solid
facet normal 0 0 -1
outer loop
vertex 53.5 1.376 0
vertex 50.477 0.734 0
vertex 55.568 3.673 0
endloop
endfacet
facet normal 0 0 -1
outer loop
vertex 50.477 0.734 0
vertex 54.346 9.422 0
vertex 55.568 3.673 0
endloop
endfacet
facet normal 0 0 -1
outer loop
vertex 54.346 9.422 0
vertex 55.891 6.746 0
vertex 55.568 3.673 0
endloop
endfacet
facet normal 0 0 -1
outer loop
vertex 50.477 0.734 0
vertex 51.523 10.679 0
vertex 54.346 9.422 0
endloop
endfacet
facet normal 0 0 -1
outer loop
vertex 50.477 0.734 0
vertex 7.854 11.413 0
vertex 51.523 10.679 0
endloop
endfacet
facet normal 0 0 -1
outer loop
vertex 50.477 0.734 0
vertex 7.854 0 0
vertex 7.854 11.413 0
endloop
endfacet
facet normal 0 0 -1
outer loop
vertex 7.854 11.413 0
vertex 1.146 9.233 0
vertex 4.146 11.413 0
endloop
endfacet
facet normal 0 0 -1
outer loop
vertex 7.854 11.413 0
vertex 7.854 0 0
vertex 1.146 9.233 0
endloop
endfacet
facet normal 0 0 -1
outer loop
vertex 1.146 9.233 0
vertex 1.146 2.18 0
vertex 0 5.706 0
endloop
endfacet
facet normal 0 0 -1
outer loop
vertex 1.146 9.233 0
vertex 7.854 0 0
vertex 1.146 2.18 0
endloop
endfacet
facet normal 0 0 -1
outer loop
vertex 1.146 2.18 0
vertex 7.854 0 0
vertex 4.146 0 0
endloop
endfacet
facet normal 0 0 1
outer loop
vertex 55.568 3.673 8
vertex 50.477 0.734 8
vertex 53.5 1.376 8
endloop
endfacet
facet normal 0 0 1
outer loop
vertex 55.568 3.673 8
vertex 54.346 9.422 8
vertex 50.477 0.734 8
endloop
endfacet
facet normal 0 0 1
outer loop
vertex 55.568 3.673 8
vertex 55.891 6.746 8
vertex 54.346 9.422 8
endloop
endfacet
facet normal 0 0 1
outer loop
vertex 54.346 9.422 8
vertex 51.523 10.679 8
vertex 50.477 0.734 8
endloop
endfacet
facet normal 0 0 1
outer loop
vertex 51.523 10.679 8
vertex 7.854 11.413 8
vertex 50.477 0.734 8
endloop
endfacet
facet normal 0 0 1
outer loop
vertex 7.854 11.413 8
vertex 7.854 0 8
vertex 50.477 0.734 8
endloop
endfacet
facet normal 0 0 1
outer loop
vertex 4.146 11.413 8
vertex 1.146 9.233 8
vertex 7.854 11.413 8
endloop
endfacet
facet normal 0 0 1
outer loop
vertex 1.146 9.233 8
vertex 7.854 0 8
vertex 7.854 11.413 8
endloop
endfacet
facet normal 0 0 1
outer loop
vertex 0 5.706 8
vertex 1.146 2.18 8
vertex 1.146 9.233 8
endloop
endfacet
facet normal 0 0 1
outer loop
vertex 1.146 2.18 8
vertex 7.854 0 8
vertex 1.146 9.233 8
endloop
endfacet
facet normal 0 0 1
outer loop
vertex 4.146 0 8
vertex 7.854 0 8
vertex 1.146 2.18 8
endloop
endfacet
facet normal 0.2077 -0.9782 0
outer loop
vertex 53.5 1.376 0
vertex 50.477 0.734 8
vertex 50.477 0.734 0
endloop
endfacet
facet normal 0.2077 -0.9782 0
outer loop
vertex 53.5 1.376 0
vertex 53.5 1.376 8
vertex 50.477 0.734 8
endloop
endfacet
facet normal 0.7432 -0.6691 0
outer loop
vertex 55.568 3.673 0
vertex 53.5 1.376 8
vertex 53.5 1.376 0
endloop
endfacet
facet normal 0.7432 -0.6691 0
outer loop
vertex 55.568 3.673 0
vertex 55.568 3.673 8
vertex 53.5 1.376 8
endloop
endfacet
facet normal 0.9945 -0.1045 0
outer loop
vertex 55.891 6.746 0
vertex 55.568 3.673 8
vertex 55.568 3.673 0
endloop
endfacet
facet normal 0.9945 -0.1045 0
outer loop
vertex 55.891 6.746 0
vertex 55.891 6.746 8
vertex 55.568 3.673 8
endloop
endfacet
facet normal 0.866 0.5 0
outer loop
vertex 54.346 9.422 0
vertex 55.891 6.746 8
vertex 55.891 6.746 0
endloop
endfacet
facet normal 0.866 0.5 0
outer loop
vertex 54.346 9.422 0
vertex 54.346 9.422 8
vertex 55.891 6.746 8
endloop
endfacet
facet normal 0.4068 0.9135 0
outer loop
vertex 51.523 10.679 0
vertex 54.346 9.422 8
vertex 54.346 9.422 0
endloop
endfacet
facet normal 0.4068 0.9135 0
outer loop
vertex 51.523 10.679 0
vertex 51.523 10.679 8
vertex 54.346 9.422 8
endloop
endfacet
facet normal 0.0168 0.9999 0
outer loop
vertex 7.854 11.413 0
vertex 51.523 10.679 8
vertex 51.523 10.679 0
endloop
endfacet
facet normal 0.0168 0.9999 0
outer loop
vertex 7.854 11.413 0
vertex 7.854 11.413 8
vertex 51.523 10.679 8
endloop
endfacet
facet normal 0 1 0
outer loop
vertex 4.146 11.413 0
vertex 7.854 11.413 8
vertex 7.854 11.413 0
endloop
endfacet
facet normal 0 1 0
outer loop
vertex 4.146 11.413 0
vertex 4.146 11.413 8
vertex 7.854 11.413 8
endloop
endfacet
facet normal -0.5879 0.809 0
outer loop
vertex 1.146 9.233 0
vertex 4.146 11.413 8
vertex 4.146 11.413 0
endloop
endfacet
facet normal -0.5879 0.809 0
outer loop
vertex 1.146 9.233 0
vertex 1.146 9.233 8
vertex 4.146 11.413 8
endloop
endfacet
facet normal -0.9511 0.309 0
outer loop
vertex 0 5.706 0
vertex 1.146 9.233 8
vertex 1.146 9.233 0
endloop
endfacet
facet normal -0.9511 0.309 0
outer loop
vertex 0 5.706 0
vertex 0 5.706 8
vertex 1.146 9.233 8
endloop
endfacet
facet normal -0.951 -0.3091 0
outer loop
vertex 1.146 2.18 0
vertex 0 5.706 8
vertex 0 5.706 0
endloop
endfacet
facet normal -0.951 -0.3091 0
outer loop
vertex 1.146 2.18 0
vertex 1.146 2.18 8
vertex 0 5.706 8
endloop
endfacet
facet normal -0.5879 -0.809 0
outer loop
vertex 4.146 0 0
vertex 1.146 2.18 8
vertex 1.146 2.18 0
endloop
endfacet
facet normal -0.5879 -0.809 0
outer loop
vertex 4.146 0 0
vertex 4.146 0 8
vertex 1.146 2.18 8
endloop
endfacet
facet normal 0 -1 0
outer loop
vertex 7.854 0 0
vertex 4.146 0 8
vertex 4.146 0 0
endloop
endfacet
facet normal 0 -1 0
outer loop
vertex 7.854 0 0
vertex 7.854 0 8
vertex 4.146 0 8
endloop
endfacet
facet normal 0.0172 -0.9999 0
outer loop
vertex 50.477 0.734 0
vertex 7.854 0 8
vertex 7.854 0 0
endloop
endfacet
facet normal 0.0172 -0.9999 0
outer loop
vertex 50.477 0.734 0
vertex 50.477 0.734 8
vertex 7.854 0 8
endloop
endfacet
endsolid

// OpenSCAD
$fn = 32;

// ----------------------------------------------------------------------
// Lever arm: two bosses 12 and 10 mm, 45 mm between centres
// ----------------------------------------------------------------------

// --- parameters (mm) ---
profile_height = 8;       // extrusion height
profile_points = 13;      // points of the closed outline

profile = [[0, 5.706], [1.146, 2.18], [4.146, 0], [7.854, 0], [50.477, 0.734], [53.5, 1.376], [55.568, 3.673], [55.891, 6.746], [54.346, 9.422], [51.523, 10.679], [7.854, 11.413], [4.146, 11.413], [1.146, 9.233]];  // single closed polygon, 13 points, counter clockwise

// --- the one profile operation ---
linear_extrude(height = profile_height) polygon(points = profile);
